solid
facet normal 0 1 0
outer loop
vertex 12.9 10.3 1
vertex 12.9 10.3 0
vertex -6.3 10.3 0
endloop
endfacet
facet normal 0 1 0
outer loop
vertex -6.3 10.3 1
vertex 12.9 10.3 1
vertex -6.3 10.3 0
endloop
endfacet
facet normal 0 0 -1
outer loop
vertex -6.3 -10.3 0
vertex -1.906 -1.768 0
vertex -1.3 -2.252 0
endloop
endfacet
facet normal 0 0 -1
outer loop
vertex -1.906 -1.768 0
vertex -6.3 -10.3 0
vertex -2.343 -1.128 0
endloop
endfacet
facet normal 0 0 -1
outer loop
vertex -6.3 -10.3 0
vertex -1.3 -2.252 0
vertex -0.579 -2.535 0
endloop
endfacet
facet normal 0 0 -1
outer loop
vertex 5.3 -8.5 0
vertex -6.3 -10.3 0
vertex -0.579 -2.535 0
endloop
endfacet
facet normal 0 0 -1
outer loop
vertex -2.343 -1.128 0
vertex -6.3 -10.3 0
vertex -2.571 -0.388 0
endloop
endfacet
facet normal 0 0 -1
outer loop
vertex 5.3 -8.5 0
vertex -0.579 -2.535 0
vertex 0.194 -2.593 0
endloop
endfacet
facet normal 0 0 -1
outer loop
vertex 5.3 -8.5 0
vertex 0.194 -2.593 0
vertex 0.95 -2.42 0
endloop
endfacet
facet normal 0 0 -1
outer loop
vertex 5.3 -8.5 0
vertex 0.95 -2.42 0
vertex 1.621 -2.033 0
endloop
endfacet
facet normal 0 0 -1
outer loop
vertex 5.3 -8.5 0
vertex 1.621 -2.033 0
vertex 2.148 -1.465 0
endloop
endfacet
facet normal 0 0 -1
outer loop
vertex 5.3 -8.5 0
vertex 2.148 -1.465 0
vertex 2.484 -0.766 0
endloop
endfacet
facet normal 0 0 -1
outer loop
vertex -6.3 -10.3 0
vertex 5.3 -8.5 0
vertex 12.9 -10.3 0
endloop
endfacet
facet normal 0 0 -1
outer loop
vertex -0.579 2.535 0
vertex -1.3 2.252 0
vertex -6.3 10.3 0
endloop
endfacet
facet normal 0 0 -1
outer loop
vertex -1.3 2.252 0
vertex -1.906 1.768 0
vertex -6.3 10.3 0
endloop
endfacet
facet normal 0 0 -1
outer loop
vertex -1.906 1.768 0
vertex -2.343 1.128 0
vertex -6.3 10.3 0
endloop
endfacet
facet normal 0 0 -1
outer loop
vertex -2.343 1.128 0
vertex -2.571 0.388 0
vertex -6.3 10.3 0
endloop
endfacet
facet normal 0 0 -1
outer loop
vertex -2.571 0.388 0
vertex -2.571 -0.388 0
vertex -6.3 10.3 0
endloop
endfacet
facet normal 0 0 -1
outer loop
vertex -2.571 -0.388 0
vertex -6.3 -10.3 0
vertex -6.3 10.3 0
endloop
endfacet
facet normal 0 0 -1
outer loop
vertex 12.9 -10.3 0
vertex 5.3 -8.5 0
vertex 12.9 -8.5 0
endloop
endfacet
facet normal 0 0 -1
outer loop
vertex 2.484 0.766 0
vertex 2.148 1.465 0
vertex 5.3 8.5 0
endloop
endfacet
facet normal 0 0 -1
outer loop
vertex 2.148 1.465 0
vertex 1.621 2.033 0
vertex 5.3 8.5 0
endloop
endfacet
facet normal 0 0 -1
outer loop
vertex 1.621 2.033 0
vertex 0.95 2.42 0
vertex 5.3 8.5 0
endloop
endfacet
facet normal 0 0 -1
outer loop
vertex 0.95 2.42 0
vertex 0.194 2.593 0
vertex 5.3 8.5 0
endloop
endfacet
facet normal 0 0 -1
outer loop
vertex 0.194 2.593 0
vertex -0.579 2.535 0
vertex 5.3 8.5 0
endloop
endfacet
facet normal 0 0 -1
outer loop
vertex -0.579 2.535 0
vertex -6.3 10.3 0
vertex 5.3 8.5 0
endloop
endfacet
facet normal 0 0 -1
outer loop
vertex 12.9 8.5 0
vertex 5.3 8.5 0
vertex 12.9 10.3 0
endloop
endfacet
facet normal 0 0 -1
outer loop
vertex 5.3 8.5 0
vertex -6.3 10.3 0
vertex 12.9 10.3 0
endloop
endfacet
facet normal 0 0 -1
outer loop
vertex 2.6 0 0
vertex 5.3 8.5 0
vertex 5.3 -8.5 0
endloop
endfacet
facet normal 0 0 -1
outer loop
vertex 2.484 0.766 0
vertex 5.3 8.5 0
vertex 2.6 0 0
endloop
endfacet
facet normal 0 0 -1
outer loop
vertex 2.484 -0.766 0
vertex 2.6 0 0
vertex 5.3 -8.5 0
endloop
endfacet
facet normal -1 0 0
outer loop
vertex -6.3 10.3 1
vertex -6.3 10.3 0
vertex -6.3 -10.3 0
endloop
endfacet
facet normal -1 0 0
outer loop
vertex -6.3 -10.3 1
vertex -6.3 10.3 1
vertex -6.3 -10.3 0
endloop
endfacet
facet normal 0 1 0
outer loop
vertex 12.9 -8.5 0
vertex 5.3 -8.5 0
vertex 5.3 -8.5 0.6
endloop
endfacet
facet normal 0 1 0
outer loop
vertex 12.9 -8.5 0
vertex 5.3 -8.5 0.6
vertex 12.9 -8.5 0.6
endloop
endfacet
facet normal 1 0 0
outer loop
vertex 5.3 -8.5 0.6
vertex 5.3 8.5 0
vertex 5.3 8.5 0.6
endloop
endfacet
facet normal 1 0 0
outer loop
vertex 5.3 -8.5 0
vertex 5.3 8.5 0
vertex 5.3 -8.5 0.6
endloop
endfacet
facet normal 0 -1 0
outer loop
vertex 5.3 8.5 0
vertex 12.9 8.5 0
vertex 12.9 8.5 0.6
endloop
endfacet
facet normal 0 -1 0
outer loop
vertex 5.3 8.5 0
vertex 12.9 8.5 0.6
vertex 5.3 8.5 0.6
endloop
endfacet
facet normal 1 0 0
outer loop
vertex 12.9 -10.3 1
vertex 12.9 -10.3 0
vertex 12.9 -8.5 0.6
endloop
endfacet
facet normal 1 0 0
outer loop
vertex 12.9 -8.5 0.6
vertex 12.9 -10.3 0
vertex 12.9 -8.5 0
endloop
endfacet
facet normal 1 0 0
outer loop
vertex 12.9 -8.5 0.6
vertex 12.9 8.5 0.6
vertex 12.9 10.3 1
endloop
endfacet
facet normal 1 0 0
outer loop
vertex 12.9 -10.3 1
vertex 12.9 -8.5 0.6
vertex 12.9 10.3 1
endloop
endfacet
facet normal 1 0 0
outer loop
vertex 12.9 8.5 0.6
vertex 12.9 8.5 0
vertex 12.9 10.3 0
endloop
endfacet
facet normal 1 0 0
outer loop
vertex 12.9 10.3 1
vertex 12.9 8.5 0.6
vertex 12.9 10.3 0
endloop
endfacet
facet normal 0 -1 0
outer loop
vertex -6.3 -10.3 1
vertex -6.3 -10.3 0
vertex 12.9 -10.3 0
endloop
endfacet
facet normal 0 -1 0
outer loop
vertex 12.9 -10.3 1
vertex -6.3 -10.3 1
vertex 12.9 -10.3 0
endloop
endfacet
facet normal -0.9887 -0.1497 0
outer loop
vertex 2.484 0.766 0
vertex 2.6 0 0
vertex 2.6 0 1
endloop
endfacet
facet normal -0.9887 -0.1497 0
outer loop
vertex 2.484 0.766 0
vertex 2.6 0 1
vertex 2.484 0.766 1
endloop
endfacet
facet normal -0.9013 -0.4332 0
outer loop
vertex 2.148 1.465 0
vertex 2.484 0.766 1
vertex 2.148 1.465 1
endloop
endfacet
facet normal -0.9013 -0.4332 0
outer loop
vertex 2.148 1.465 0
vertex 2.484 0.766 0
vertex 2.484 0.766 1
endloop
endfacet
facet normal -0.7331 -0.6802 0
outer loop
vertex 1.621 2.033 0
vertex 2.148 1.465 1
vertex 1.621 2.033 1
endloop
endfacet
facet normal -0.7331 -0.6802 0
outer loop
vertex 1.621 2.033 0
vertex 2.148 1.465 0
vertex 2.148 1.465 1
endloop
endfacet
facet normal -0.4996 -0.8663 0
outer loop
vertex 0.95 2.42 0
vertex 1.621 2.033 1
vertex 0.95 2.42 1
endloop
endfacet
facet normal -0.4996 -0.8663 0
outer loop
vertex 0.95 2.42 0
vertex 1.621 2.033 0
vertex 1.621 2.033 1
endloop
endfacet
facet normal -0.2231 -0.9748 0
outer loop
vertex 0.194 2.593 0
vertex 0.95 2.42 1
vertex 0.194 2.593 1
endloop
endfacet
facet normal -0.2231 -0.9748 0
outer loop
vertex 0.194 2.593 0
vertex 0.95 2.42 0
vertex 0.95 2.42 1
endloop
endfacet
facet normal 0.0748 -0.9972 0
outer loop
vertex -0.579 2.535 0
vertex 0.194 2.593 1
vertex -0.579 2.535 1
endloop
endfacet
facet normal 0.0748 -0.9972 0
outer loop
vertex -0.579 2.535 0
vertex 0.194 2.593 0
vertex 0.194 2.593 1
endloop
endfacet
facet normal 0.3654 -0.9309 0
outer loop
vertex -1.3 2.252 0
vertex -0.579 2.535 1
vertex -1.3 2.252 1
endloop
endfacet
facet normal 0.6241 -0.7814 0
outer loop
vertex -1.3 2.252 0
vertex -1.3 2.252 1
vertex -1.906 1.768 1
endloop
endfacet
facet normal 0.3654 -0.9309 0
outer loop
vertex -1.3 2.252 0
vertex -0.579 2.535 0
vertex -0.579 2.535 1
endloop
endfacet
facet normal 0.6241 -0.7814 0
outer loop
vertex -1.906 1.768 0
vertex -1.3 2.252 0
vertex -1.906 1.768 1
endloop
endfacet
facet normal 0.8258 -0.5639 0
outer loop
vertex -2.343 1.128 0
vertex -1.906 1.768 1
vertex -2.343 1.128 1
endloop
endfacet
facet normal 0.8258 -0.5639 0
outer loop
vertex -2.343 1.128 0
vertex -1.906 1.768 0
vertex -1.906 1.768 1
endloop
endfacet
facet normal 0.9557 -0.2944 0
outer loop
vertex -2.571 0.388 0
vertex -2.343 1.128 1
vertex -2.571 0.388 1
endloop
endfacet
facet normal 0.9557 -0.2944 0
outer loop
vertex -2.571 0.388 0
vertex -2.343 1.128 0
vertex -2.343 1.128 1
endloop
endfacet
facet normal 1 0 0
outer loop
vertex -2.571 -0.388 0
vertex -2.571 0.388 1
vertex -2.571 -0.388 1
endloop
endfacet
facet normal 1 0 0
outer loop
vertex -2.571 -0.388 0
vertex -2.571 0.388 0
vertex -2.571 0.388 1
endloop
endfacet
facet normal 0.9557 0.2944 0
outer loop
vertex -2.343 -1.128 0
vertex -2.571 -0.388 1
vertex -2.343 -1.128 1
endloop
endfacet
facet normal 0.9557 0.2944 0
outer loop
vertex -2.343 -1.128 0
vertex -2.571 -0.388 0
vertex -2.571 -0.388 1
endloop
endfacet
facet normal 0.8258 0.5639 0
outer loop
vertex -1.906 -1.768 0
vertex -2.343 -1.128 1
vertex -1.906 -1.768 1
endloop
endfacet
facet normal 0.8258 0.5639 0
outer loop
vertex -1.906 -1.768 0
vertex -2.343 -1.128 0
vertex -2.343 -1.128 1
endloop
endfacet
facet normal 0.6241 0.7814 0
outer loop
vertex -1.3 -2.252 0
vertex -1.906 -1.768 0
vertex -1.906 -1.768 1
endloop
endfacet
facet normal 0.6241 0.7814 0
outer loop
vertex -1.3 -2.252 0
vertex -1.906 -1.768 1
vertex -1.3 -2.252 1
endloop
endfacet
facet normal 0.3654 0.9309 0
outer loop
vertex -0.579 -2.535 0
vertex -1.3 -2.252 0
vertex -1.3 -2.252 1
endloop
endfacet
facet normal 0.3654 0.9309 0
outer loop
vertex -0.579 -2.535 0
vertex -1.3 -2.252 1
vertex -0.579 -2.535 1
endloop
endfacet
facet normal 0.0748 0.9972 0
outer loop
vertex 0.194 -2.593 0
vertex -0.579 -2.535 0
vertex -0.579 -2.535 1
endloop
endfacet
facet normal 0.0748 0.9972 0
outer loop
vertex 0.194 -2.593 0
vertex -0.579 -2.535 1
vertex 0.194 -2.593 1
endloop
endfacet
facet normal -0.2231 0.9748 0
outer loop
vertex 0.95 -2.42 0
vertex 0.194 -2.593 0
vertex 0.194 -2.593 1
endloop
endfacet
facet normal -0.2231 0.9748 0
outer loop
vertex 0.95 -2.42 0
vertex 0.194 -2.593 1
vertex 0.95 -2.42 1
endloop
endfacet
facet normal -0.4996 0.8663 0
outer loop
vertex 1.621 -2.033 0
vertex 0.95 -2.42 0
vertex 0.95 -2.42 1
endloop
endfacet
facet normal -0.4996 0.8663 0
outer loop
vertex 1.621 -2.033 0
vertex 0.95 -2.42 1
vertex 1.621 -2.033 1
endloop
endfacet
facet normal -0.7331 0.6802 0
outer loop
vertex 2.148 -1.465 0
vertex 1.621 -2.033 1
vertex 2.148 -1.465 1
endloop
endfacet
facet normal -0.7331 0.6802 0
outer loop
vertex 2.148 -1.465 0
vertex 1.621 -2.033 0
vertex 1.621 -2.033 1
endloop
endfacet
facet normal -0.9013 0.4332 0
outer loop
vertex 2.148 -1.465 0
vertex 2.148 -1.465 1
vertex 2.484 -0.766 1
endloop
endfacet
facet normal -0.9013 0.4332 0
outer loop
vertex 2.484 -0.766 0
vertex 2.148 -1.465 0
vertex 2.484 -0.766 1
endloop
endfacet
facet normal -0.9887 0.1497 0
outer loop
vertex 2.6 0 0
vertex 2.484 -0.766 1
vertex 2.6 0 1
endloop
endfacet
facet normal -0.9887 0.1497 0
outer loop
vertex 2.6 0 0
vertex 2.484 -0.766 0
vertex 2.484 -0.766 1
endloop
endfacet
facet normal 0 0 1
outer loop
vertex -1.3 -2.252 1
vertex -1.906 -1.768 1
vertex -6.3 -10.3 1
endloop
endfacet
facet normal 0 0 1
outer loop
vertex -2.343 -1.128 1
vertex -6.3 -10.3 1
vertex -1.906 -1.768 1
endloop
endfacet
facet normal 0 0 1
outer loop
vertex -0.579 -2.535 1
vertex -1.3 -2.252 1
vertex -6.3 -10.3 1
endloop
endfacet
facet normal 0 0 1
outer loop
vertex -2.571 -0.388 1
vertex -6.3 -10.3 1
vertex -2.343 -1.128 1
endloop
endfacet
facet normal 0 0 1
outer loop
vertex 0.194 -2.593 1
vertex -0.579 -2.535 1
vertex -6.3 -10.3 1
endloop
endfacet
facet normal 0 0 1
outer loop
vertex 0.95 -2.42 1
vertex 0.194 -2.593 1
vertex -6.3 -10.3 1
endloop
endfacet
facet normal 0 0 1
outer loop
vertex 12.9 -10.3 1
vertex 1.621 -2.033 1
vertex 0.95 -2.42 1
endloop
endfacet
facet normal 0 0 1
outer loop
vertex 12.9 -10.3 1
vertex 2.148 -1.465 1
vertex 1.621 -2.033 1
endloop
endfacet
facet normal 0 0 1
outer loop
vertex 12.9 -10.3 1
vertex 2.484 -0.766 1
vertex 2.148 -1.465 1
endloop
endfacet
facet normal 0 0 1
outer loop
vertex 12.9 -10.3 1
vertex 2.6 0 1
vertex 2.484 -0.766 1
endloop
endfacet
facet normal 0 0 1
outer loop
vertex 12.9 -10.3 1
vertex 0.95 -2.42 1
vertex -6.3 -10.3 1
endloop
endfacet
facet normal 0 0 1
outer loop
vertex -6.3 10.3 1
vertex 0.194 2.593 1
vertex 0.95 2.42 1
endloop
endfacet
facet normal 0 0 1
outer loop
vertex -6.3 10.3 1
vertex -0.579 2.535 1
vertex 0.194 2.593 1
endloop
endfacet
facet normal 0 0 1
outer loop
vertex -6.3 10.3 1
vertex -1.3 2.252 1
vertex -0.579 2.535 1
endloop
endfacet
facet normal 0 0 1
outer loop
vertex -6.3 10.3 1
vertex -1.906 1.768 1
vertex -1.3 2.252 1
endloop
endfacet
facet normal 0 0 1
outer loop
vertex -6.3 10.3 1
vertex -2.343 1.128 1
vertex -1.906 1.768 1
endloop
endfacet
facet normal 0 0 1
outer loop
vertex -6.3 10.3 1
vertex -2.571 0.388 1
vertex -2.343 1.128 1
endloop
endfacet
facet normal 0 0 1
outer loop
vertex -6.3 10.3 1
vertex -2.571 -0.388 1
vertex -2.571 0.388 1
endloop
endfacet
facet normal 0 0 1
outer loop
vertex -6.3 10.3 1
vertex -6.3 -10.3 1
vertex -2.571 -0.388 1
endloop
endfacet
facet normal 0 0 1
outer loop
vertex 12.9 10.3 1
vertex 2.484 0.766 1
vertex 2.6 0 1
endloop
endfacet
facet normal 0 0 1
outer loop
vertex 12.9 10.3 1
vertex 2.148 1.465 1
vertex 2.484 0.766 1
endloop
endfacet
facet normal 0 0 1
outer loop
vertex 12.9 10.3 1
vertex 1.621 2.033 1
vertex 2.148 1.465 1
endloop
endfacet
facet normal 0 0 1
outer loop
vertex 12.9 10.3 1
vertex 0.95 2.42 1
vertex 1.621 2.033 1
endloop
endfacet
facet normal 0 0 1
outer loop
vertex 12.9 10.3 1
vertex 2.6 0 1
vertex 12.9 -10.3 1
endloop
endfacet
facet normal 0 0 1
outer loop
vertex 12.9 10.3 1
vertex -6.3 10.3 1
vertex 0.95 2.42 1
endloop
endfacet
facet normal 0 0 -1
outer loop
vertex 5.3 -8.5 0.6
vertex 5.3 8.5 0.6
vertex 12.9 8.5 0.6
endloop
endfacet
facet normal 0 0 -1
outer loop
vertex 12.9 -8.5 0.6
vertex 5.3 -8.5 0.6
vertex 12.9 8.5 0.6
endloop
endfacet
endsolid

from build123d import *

# Parameters (mm, degrees)
SKETCH2_R           = 2.6
BOSS_EXTRUDE1_DEPTH = 1
CUT_EXTRUDE1_DEPTH  = 0.6


with BuildPart() as part:
    # Sketch2 → Boss-Extrude1 (new body)
    with BuildSketch(Plane.XY):
        Polygon((-6.3, 10.3), (-6.3, -10.3), (-5.3, -10.3), (6.3, -10.3), (8.1, -10.3), (12.9, -10.3), (12.9, 10.3), (8.1, 10.3), (6.3, 10.3), (-5.3, 10.3), align=None)
        Circle(SKETCH2_R, mode=Mode.SUBTRACT)
    extrude(amount=BOSS_EXTRUDE1_DEPTH)

    # Sketch3 → Cut-Extrude1 (cut)
    with BuildSketch(Plane.XY):
        Polygon((5.3, 8.5), (5.3, -8.5), (6.3, -8.5), (12.9, -8.5), (12.9, 8.5), (6.3, 8.5), align=None)
    extrude(amount=CUT_EXTRUDE1_DEPTH, mode=Mode.SUBTRACT)


solid = part.part
